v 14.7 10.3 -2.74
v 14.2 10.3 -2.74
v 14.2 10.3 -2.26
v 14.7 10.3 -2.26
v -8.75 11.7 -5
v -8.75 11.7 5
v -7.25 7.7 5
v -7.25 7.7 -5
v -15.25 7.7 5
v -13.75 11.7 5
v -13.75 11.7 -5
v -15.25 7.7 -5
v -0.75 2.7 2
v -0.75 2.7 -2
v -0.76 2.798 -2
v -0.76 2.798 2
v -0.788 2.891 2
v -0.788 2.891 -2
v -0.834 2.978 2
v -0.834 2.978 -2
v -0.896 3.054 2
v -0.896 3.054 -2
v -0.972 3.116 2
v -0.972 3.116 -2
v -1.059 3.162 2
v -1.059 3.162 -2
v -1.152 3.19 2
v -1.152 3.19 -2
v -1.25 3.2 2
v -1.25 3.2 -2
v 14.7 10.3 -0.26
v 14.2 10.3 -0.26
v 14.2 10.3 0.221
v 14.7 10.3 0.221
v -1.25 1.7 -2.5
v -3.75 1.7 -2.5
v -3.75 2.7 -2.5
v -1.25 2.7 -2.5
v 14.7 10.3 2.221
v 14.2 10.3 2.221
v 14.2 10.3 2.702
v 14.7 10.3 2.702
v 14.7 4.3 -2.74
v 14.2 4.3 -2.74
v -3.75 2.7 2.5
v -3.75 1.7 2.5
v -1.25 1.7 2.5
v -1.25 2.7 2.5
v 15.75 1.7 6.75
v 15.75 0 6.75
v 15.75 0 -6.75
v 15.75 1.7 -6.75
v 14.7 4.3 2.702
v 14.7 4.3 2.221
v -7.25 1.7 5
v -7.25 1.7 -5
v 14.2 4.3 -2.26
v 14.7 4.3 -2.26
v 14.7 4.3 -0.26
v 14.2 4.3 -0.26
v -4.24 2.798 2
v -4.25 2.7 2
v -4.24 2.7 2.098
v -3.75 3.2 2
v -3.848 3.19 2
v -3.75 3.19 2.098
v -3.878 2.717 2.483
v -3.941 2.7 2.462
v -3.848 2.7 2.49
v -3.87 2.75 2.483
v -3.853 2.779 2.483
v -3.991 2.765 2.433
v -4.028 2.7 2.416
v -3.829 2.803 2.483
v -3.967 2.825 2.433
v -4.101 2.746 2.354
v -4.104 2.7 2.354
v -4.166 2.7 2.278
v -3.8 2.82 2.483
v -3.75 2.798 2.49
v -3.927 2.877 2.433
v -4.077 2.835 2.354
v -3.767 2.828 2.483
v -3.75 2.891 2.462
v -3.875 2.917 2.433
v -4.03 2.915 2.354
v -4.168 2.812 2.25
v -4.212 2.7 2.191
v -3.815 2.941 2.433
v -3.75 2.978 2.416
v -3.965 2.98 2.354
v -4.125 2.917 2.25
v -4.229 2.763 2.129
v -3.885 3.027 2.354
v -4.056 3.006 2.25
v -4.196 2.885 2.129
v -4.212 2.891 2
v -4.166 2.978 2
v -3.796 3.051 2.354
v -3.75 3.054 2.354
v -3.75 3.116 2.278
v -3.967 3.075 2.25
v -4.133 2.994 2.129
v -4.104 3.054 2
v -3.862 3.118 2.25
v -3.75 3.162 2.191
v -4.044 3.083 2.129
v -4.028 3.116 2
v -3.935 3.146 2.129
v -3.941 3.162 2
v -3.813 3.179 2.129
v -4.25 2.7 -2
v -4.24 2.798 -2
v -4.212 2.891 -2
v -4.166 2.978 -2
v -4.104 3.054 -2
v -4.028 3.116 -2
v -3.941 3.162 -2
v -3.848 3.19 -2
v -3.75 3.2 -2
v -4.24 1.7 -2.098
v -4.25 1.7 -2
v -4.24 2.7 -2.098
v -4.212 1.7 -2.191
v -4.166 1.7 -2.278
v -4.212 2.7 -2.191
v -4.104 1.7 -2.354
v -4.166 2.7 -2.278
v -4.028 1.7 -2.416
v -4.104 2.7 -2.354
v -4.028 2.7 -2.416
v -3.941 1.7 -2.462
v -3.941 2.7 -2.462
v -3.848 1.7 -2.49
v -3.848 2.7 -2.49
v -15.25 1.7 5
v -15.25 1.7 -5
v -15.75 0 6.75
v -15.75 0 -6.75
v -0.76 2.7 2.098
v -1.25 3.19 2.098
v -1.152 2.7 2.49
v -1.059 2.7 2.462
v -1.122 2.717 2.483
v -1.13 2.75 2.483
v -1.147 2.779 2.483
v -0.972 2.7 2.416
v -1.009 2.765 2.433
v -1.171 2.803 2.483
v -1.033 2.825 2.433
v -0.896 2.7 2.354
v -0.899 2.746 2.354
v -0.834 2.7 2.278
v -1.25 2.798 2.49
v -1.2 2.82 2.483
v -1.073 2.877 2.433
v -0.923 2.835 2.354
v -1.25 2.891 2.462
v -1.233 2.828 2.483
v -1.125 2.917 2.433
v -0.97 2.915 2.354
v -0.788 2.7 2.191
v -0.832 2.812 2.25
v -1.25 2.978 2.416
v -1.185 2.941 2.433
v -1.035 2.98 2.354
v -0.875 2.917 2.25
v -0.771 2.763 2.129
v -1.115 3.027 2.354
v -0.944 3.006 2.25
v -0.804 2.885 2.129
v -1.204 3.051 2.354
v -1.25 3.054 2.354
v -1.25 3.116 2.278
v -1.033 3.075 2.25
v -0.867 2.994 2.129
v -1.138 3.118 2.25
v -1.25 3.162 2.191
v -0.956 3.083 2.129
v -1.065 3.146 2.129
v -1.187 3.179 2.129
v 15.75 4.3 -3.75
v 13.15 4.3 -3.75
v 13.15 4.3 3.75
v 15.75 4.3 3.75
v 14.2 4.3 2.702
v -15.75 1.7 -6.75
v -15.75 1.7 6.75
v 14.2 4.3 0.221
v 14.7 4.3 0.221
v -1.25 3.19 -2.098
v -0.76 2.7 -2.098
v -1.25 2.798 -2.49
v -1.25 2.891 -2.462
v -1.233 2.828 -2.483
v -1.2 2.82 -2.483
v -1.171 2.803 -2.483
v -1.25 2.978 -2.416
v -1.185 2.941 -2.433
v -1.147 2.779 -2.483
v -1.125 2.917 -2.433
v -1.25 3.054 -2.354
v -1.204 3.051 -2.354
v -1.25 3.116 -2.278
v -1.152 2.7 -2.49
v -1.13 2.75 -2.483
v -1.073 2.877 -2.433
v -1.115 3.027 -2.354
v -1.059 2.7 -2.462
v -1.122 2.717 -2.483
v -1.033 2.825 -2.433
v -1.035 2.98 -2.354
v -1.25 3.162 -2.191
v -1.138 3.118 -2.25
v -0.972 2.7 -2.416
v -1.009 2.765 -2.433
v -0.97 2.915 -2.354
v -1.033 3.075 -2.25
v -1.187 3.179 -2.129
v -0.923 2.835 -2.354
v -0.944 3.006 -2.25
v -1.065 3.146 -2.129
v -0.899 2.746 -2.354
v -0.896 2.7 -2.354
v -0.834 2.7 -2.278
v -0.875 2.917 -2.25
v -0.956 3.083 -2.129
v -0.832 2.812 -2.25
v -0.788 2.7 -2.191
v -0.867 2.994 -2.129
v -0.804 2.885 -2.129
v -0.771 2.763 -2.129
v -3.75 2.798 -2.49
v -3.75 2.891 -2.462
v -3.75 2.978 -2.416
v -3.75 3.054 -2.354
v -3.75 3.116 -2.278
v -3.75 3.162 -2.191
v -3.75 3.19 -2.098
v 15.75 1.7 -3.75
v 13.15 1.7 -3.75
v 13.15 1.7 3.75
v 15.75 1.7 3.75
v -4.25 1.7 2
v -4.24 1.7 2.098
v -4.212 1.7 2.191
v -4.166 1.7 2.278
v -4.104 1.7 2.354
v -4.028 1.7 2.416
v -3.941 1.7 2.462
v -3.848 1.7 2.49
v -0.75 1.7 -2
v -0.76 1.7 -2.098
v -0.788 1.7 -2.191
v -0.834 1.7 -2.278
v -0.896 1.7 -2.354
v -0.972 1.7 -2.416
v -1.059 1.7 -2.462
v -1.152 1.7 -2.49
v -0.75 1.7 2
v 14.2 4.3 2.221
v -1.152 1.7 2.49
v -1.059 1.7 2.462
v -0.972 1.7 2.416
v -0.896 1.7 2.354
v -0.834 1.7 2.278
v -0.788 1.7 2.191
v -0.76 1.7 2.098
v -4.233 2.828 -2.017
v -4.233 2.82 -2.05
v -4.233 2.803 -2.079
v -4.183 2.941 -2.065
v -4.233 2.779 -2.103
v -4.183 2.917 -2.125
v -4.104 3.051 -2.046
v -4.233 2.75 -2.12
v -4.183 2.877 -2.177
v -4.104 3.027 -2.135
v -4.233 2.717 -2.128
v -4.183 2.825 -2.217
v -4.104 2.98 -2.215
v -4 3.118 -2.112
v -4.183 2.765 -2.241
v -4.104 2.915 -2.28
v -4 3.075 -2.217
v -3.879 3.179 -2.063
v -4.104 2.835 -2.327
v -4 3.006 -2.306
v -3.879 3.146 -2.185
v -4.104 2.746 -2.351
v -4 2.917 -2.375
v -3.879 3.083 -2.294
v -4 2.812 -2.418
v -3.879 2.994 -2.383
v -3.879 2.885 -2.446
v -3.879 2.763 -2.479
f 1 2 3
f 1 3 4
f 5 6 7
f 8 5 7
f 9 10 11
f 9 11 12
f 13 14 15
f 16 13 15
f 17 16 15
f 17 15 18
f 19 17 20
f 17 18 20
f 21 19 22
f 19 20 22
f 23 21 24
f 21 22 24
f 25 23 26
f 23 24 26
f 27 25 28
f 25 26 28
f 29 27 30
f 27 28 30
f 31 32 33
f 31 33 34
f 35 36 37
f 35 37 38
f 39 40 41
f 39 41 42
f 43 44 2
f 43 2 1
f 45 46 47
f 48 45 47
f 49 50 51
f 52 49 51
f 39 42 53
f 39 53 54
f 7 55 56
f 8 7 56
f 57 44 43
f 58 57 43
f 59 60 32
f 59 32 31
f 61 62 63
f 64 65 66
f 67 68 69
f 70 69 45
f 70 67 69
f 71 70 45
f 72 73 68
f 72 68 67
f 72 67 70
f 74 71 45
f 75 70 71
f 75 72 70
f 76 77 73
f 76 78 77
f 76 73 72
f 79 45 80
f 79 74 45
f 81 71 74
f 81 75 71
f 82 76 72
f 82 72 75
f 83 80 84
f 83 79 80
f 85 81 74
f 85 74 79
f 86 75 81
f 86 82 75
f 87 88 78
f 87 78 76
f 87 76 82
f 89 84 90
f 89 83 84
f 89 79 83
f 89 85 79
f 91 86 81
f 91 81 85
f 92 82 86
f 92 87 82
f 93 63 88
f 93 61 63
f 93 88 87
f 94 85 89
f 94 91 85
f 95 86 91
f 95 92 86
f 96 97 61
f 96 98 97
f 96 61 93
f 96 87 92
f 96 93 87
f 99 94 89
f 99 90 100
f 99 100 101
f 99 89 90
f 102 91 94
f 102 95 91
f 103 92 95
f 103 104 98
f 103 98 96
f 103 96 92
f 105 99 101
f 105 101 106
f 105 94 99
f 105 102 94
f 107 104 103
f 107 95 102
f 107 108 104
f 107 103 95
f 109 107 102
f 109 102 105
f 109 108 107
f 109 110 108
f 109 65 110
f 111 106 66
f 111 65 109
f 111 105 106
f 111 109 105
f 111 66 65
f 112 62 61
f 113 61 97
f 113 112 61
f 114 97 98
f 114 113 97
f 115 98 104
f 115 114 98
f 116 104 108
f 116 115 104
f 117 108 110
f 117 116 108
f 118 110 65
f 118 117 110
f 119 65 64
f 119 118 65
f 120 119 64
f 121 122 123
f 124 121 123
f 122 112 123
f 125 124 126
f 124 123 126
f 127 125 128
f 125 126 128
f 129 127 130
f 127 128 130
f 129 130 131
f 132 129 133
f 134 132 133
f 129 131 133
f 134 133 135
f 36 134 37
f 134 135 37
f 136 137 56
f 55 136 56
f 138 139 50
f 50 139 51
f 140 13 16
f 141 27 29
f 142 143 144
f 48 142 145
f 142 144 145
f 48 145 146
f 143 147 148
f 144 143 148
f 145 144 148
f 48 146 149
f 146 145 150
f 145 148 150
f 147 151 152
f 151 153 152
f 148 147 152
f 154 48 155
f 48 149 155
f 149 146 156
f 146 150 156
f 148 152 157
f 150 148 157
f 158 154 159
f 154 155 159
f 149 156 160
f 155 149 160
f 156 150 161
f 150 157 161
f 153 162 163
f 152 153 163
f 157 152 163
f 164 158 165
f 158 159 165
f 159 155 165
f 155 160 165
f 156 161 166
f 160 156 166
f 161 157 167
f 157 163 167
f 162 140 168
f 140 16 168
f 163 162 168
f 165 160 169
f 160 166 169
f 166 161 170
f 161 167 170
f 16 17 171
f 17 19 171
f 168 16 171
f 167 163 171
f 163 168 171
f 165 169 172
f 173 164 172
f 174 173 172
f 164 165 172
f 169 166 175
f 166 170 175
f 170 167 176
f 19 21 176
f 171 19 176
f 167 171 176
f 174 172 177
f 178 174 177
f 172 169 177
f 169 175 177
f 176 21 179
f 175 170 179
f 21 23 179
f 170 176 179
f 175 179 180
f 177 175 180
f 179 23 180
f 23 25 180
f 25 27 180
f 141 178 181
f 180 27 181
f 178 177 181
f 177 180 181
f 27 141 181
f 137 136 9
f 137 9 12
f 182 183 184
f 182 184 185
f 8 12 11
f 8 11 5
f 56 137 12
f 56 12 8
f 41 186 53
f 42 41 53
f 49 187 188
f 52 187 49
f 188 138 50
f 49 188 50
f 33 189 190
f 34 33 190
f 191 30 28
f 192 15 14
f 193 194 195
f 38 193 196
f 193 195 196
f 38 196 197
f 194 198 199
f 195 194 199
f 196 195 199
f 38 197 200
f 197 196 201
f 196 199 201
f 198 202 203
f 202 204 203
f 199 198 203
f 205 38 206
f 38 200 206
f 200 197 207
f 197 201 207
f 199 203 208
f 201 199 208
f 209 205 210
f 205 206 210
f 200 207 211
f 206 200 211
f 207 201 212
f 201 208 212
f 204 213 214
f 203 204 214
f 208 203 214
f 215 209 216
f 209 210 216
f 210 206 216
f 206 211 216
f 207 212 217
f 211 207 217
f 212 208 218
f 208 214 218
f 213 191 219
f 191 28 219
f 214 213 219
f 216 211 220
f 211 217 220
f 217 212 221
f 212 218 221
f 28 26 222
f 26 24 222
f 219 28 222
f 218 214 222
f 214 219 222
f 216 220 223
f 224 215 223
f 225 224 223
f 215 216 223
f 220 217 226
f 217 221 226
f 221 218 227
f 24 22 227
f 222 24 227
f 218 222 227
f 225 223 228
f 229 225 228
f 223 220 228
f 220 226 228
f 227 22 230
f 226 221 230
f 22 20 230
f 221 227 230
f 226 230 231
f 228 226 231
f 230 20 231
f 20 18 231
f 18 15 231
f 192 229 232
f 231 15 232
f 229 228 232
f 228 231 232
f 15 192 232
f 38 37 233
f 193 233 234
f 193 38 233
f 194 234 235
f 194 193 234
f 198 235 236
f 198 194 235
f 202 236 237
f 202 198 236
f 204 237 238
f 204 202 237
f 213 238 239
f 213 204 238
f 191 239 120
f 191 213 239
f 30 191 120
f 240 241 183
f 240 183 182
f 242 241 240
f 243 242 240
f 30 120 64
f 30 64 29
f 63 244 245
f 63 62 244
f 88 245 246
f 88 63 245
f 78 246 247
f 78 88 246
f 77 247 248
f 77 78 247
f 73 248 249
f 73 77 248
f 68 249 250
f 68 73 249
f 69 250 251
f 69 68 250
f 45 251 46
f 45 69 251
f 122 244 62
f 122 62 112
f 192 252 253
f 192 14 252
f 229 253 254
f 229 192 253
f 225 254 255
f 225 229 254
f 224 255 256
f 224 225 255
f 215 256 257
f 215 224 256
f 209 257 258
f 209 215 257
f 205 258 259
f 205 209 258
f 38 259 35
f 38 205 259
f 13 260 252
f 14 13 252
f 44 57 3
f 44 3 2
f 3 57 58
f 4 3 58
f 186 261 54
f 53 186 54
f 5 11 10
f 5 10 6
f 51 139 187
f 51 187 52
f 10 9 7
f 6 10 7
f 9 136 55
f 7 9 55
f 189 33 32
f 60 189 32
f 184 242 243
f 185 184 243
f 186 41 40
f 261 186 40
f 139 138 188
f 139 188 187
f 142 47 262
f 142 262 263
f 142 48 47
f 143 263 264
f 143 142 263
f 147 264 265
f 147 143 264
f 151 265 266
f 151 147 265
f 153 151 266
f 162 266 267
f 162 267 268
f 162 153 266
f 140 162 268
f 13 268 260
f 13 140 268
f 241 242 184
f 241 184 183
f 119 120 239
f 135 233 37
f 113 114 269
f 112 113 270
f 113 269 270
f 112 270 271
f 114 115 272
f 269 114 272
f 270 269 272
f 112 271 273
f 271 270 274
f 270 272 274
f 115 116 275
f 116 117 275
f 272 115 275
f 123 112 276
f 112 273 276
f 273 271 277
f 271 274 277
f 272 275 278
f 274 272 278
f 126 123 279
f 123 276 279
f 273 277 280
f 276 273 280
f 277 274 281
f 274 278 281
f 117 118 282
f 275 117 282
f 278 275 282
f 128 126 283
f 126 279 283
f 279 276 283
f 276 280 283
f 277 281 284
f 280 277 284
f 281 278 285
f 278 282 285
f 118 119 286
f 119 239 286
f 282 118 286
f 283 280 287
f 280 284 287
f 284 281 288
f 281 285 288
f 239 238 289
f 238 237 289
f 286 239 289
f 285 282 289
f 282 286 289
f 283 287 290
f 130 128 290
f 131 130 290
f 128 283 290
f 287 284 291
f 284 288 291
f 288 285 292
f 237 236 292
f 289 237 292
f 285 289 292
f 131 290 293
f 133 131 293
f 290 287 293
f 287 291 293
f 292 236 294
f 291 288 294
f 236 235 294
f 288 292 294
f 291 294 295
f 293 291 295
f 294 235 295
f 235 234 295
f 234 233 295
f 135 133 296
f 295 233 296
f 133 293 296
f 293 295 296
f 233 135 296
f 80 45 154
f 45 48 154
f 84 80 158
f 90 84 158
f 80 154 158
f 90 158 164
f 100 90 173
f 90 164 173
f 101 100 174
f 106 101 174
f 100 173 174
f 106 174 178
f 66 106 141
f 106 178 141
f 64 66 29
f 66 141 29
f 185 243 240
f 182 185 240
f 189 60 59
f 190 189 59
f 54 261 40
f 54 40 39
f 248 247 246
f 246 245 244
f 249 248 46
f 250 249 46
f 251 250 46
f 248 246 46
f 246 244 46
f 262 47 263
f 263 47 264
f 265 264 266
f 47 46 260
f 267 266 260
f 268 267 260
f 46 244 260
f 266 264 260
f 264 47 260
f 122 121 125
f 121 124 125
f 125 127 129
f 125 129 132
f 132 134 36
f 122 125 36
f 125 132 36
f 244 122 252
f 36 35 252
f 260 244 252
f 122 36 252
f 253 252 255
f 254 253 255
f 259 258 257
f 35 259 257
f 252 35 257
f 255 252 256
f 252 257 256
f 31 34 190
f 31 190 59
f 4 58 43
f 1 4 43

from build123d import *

# Parameters (mm, degrees)
CROQUIS1_W                = 31.5
CROQUIS1_H                = 13.5
SALIENTE_EXTRUIR1_DEPTH   = 1.7
CROQUIS2_W                = 2.6
CROQUIS2_H                = 7.5
SALIENTE_EXTRUIR2_DEPTH   = 2.6
CROQUIS3_W                = 0.5
CROQUIS3_H                = 0.480769231
SALIENTE_EXTRUIR3_DEPTH   = 6
CROQUIS3_H_2              = 0.48076923
SALIENTE_EXTRUIR3_2_DEPTH = 6
SALIENTE_EXTRUIR3_3_DEPTH = 6
CROQUIS4_W                = 8
CROQUIS4_H                = 10
SALIENTE_EXTRUIR4_DEPTH   = 10
CORTAR_EXTRUIR1_DEPTH     = 23.869521202
CROQUIS6_W                = 3.5
CROQUIS6_H                = 5
SALIENTE_EXTRUIR5_DEPTH   = 1.5
REDONDEO1_R               = 0.5


with BuildPart() as part:
    # Croquis1 → Saliente-Extruir1 (new body)
    with BuildSketch(Plane(origin=(0, 0, 0), x_dir=(1, 0, 0), z_dir=(0, 1, 0))):
        Rectangle(CROQUIS1_W, CROQUIS1_H)
    extrude(amount=SALIENTE_EXTRUIR1_DEPTH)


with BuildPart() as body_2:
    # Croquis2 → Saliente-Extruir2 (new body)
    with BuildSketch(Plane(origin=(0, 1.7, 0), x_dir=(1, 0, 0), z_dir=(0, 1, 0))):
        with Locations((14.45, 0)):
            Rectangle(CROQUIS2_W, CROQUIS2_H)
    extrude(amount=SALIENTE_EXTRUIR2_DEPTH)


with BuildPart() as body_3:
    # Croquis3 → Saliente-Extruir3 (new body)
    with BuildSketch(Plane(origin=(0, 4.3, 0), x_dir=(1, 0, 0), z_dir=(0, 1, 0))):
        with Locations((14.45, 0.01923077)):
            Rectangle(CROQUIS3_W, CROQUIS3_H)
    extrude(amount=SALIENTE_EXTRUIR3_DEPTH)


with BuildPart() as body_4:
    # Croquis3 → Saliente-Extruir3 2 (new body)
    with BuildSketch(Plane(origin=(0, 4.3, 0), x_dir=(1, 0, 0), z_dir=(0, 1, 0))):
        with Locations((14.45, 2.5)):
            Rectangle(CROQUIS3_W, CROQUIS3_H_2)
    extrude(amount=SALIENTE_EXTRUIR3_2_DEPTH)


with BuildPart() as body_5:
    # Croquis3 → Saliente-Extruir3 3 (new body)
    with BuildSketch(Plane(origin=(0, 4.3, 0), x_dir=(1, 0, 0), z_dir=(0, 1, 0))):
        with Locations((14.45, -2.461538461)):
            Rectangle(CROQUIS3_W, CROQUIS3_H)
    extrude(amount=SALIENTE_EXTRUIR3_3_DEPTH)


with BuildPart() as body_6:
    # Croquis4 → Saliente-Extruir4 (new body)
    with BuildSketch(Plane(origin=(0, 1.7, 0), x_dir=(1, 0, 0), z_dir=(0, 1, 0))):
        with Locations((-11.25, 0)):
            Rectangle(CROQUIS4_W, CROQUIS4_H)
    extrude(amount=SALIENTE_EXTRUIR4_DEPTH)

    # Croquis5 → Cortar-Extruir1 (cut, through all)
    with BuildSketch(Plane.XY.offset(5)):
        Polygon((-8.75, 11.7), (-7.25, 7.7), (-7.25, 11.7), align=None)
        Polygon((-15.25, 7.7), (-15.25, 11.7), (-13.75, 11.7), align=None)
    extrude(amount=-CORTAR_EXTRUIR1_DEPTH, mode=Mode.SUBTRACT)


with BuildPart() as body_7:
    # Croquis6 → Saliente-Extruir5 (new body)
    with BuildSketch(Plane(origin=(0, 1.7, 0), x_dir=(1, 0, 0), z_dir=(0, 1, 0))):
        with Locations((-2.5, 0)):
            Rectangle(CROQUIS6_W, CROQUIS6_H)
    extrude(amount=SALIENTE_EXTRUIR5_DEPTH)

    # Redondeo1
    redondeo1_edges = [body_7.edges().sort_by_distance(p)[0] for p in [
        (-0.75, 3.2, 0),
        (-2.5, 3.2, -2.5),
        (-4.25, 3.2, 0),
        (-4.25, 2.45, -2.5),
        (-0.75, 2.45, -2.5),
        (-0.75, 2.45, 2.5),
        (-4.25, 2.45, 2.5),
        (-2.5, 3.2, 2.5),
    ]]
    fillet(redondeo1_edges, radius=REDONDEO1_R)


solid = Compound([part.part, body_2.part, body_3.part, body_4.part, body_5.part, body_6.part, body_7.part])
